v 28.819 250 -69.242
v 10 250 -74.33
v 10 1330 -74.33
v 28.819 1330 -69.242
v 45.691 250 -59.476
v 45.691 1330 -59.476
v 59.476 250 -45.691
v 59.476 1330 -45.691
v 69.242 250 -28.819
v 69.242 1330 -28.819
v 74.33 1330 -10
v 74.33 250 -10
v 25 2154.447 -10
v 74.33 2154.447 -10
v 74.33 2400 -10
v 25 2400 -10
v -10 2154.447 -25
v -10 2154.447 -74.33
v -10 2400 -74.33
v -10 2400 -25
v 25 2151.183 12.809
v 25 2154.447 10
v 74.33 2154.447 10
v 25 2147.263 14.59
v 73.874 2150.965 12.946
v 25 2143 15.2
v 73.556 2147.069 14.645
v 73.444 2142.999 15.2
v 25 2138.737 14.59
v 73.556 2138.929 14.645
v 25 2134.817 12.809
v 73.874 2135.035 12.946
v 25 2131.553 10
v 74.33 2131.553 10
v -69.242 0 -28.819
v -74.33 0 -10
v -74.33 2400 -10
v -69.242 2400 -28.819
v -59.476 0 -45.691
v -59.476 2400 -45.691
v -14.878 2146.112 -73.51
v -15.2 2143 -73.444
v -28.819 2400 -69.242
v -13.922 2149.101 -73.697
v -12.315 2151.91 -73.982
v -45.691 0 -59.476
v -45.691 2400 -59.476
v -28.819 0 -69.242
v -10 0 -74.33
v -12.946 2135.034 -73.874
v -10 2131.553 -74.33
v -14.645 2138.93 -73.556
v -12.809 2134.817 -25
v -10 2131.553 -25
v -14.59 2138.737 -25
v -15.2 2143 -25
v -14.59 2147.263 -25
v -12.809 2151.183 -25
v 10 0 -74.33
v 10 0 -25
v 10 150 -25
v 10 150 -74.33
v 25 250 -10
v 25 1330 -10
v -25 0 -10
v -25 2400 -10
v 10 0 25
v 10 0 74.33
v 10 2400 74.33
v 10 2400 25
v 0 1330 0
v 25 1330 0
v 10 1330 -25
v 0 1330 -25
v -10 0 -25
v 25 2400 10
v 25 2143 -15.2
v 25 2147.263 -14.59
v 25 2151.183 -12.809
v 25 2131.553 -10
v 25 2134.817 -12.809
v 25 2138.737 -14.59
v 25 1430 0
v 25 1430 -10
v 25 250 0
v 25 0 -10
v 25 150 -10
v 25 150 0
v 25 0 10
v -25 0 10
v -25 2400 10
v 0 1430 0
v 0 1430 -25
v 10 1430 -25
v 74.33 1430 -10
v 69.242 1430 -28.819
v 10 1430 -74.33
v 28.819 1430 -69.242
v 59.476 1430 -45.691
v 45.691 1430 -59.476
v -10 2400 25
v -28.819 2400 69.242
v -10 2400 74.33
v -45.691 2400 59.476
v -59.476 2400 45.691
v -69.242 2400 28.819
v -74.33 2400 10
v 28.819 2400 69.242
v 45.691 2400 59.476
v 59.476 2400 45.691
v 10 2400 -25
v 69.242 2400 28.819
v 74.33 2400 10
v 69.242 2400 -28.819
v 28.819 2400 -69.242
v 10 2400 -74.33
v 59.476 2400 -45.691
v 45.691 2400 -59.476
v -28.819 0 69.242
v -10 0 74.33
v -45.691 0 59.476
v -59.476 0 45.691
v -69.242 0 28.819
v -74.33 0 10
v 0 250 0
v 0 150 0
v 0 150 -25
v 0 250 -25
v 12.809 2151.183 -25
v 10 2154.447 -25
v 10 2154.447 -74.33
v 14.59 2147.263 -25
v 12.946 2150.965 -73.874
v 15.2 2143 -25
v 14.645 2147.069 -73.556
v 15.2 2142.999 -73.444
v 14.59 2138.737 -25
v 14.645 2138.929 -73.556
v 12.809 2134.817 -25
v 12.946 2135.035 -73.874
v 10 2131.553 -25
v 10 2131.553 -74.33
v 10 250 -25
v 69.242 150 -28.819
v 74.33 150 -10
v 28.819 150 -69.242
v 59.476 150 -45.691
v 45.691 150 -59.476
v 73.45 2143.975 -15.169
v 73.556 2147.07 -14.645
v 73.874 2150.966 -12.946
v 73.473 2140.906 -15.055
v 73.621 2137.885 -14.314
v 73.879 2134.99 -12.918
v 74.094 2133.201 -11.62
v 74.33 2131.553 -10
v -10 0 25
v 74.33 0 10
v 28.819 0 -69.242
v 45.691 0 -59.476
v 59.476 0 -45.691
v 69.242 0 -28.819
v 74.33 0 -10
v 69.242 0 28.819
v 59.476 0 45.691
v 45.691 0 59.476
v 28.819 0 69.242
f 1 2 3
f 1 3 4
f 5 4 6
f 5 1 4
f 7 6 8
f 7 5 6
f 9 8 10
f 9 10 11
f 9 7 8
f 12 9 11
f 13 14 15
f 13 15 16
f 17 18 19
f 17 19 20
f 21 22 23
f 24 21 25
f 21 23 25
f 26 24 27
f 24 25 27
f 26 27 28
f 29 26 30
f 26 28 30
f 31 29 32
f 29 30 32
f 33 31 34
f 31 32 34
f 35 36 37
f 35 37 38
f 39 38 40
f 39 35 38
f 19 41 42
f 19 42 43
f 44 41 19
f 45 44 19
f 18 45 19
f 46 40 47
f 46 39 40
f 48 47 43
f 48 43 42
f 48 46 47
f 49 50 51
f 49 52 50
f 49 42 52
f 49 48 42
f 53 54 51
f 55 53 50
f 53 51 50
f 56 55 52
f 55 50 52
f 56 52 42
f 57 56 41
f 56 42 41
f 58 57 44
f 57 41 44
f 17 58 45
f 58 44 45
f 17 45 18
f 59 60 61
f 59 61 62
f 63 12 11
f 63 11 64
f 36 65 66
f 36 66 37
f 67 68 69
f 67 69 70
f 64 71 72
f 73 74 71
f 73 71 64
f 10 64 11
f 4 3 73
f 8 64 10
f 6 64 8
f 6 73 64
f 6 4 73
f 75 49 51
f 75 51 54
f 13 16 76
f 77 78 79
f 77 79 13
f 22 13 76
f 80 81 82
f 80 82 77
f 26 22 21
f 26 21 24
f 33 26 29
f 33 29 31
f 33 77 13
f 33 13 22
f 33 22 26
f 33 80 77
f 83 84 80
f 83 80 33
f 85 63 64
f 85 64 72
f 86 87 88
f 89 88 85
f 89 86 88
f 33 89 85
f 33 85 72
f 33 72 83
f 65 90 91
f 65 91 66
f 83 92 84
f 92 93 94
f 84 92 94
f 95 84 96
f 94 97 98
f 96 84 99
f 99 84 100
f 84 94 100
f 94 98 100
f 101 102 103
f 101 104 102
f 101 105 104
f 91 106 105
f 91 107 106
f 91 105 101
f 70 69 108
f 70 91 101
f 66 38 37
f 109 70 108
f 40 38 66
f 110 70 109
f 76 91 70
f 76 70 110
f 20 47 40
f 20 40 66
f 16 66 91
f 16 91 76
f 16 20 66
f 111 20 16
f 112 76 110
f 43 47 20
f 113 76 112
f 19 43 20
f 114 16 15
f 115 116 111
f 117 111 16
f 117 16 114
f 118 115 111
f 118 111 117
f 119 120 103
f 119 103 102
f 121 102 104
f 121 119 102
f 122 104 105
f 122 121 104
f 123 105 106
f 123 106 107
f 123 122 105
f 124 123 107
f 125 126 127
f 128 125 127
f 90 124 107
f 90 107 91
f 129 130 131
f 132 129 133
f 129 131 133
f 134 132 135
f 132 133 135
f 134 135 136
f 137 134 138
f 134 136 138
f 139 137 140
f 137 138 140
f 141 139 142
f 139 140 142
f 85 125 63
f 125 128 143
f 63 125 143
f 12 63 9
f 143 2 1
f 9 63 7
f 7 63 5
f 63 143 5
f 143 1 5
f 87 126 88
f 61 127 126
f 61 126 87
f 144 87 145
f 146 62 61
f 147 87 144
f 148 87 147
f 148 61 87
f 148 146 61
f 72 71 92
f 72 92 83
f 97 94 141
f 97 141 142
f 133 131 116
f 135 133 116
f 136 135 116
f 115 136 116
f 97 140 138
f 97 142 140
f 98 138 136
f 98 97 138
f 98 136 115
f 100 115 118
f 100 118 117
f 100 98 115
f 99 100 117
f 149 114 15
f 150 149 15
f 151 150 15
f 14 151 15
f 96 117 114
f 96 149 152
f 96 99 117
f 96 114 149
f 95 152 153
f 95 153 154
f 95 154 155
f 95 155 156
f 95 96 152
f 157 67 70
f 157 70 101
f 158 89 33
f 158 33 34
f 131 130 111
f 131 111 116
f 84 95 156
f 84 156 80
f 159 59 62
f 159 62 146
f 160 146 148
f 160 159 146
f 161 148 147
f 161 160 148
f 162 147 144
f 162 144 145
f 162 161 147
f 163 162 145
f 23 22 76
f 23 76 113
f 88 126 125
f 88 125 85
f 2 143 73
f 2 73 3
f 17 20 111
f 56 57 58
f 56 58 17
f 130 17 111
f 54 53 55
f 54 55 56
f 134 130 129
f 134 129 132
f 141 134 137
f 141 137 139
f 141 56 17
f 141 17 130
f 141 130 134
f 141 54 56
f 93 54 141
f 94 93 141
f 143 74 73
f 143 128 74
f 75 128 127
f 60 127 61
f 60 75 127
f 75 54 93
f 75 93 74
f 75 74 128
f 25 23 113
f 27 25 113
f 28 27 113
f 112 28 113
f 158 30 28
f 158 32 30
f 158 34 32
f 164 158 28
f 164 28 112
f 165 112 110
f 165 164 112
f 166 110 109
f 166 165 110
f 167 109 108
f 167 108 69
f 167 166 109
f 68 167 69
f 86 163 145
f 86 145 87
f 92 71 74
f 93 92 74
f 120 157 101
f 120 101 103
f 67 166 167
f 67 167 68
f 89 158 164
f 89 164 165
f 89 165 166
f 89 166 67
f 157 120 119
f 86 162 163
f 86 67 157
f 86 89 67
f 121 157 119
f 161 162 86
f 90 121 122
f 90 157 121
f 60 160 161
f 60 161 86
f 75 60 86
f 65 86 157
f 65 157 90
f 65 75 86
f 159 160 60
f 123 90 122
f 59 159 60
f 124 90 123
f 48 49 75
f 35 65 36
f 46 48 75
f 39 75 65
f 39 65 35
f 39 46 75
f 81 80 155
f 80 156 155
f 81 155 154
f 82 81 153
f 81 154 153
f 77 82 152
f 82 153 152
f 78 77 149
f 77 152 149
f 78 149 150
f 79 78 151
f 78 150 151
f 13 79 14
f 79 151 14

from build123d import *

# Parameters (mm, degrees)
BOSS_EXTRUDE2_DEPTH     = 4000
CUT_EXTRUDE1_START      = 200
SKETCH2_W               = 74.330343737
SKETCH2_H               = 74.330343737
CUT_EXTRUDE1_DEPTH      = 50
CUT_EXTRUDE2_START      = 1380
SKETCH2_2_W             = 74.330343737
SKETCH2_2_H             = 74.330343737
CUT_EXTRUDE2_DEPTH      = 50
SKETCH3_R               = 15.2
CUT_EXTRUDE3_DEPTH      = 49.330343737
SKETCH4_R               = 15.2
CUT_EXTRUDE4_DEPTH      = 49.330343737
CUT_EXTRUDE5_DEPTH      = 4002.923477282
CUT_EXTRUDE5_DEPTH_BACK = 4002.923477282
SKETCH5_W               = 148.660687474
SKETCH5_H               = 1600


with BuildPart() as part:
    # Sketch1 → Boss-Extrude2 (new body)
    with BuildSketch(Plane(origin=(0, 0, 0), x_dir=(1, 0, 0), z_dir=(0, 1, 0))):
        with BuildLine():
            Line((-10, 74.330343737), (-10, 25))
            Line((-10, 25), (10, 25))
            Line((10, 25), (10, 74.330343737))
            ThreePointArc((10, 74.330343737), (53.033008589, 53.033008589), (74.330343737, 10))
            Line((74.330343737, 10), (25, 10))
            Line((25, 10), (25, -10))
            Line((25, -10), (74.330343737, -10))
            ThreePointArc((74.330343737, -10), (53.033008589, -53.033008589), (10, -74.330343737))
            Line((10, -74.330343737), (10, -25))
            Line((10, -25), (-10, -25))
            Line((-10, -25), (-10, -74.330343737))
            ThreePointArc((-10, -74.330343737), (-53.033008589, -53.033008589), (-74.330343737, -10))
            Line((-74.330343737, -10), (-25, -10))
            Line((-25, -10), (-25, 10))
            Line((-25, 10), (-74.330343737, 10))
            ThreePointArc((-74.330343737, 10), (-53.033008589, 53.033008589), (-10, 74.330343737))
        make_face()
    extrude(amount=BOSS_EXTRUDE2_DEPTH)

    # Sketch2 → Cut-Extrude1 (cut, symmetric)
    with BuildSketch(Plane(origin=(0, 0, 0), x_dir=(1, 0, 0), z_dir=(0, 1, 0)).offset(CUT_EXTRUDE1_START)):
        with Locations((37.165171869, 37.165171869)):
            Rectangle(SKETCH2_W, SKETCH2_H)
    extrude(amount=CUT_EXTRUDE1_DEPTH, both=True, mode=Mode.SUBTRACT)

    # Sketch2<2> → Cut-Extrude2 (cut, symmetric)
    with BuildSketch(Plane(origin=(0, 0, 0), x_dir=(1, 0, 0), z_dir=(0, 1, 0)).offset(CUT_EXTRUDE2_START)):
        with Locations((37.165171869, 37.165171869)):
            Rectangle(SKETCH2_2_W, SKETCH2_2_H)
    extrude(amount=CUT_EXTRUDE2_DEPTH, both=True, mode=Mode.SUBTRACT)

    # Sketch3 → Cut-Extrude3 (cut)
    with BuildSketch(Plane(origin=(74.330343737, 0, 0), x_dir=(0, 0, -1), z_dir=(1, 0, 0))):
        with Locations((0, 2143)):
            Circle(SKETCH3_R)
    extrude(amount=-CUT_EXTRUDE3_DEPTH, mode=Mode.SUBTRACT)

    # Sketch4 → Cut-Extrude4 (cut)
    with BuildSketch(Plane(origin=(0, 0, -74.330343737), x_dir=(-1, 0, 0), z_dir=(0, 0, -1))):
        with Locations((0, 2143)):
            Circle(SKETCH4_R)
    extrude(amount=-CUT_EXTRUDE4_DEPTH, mode=Mode.SUBTRACT)

    # Sketch5 → Cut-Extrude5 (cut, two sides: drawn at the far end of the back side and taken through both)
    with BuildSketch(Plane.XY.offset(25).offset(-CUT_EXTRUDE5_DEPTH_BACK)):
        with Locations((0, 3200)):
            Rectangle(SKETCH5_W, SKETCH5_H)
    extrude(amount=CUT_EXTRUDE5_DEPTH + CUT_EXTRUDE5_DEPTH_BACK, mode=Mode.SUBTRACT)


solid = part.part
